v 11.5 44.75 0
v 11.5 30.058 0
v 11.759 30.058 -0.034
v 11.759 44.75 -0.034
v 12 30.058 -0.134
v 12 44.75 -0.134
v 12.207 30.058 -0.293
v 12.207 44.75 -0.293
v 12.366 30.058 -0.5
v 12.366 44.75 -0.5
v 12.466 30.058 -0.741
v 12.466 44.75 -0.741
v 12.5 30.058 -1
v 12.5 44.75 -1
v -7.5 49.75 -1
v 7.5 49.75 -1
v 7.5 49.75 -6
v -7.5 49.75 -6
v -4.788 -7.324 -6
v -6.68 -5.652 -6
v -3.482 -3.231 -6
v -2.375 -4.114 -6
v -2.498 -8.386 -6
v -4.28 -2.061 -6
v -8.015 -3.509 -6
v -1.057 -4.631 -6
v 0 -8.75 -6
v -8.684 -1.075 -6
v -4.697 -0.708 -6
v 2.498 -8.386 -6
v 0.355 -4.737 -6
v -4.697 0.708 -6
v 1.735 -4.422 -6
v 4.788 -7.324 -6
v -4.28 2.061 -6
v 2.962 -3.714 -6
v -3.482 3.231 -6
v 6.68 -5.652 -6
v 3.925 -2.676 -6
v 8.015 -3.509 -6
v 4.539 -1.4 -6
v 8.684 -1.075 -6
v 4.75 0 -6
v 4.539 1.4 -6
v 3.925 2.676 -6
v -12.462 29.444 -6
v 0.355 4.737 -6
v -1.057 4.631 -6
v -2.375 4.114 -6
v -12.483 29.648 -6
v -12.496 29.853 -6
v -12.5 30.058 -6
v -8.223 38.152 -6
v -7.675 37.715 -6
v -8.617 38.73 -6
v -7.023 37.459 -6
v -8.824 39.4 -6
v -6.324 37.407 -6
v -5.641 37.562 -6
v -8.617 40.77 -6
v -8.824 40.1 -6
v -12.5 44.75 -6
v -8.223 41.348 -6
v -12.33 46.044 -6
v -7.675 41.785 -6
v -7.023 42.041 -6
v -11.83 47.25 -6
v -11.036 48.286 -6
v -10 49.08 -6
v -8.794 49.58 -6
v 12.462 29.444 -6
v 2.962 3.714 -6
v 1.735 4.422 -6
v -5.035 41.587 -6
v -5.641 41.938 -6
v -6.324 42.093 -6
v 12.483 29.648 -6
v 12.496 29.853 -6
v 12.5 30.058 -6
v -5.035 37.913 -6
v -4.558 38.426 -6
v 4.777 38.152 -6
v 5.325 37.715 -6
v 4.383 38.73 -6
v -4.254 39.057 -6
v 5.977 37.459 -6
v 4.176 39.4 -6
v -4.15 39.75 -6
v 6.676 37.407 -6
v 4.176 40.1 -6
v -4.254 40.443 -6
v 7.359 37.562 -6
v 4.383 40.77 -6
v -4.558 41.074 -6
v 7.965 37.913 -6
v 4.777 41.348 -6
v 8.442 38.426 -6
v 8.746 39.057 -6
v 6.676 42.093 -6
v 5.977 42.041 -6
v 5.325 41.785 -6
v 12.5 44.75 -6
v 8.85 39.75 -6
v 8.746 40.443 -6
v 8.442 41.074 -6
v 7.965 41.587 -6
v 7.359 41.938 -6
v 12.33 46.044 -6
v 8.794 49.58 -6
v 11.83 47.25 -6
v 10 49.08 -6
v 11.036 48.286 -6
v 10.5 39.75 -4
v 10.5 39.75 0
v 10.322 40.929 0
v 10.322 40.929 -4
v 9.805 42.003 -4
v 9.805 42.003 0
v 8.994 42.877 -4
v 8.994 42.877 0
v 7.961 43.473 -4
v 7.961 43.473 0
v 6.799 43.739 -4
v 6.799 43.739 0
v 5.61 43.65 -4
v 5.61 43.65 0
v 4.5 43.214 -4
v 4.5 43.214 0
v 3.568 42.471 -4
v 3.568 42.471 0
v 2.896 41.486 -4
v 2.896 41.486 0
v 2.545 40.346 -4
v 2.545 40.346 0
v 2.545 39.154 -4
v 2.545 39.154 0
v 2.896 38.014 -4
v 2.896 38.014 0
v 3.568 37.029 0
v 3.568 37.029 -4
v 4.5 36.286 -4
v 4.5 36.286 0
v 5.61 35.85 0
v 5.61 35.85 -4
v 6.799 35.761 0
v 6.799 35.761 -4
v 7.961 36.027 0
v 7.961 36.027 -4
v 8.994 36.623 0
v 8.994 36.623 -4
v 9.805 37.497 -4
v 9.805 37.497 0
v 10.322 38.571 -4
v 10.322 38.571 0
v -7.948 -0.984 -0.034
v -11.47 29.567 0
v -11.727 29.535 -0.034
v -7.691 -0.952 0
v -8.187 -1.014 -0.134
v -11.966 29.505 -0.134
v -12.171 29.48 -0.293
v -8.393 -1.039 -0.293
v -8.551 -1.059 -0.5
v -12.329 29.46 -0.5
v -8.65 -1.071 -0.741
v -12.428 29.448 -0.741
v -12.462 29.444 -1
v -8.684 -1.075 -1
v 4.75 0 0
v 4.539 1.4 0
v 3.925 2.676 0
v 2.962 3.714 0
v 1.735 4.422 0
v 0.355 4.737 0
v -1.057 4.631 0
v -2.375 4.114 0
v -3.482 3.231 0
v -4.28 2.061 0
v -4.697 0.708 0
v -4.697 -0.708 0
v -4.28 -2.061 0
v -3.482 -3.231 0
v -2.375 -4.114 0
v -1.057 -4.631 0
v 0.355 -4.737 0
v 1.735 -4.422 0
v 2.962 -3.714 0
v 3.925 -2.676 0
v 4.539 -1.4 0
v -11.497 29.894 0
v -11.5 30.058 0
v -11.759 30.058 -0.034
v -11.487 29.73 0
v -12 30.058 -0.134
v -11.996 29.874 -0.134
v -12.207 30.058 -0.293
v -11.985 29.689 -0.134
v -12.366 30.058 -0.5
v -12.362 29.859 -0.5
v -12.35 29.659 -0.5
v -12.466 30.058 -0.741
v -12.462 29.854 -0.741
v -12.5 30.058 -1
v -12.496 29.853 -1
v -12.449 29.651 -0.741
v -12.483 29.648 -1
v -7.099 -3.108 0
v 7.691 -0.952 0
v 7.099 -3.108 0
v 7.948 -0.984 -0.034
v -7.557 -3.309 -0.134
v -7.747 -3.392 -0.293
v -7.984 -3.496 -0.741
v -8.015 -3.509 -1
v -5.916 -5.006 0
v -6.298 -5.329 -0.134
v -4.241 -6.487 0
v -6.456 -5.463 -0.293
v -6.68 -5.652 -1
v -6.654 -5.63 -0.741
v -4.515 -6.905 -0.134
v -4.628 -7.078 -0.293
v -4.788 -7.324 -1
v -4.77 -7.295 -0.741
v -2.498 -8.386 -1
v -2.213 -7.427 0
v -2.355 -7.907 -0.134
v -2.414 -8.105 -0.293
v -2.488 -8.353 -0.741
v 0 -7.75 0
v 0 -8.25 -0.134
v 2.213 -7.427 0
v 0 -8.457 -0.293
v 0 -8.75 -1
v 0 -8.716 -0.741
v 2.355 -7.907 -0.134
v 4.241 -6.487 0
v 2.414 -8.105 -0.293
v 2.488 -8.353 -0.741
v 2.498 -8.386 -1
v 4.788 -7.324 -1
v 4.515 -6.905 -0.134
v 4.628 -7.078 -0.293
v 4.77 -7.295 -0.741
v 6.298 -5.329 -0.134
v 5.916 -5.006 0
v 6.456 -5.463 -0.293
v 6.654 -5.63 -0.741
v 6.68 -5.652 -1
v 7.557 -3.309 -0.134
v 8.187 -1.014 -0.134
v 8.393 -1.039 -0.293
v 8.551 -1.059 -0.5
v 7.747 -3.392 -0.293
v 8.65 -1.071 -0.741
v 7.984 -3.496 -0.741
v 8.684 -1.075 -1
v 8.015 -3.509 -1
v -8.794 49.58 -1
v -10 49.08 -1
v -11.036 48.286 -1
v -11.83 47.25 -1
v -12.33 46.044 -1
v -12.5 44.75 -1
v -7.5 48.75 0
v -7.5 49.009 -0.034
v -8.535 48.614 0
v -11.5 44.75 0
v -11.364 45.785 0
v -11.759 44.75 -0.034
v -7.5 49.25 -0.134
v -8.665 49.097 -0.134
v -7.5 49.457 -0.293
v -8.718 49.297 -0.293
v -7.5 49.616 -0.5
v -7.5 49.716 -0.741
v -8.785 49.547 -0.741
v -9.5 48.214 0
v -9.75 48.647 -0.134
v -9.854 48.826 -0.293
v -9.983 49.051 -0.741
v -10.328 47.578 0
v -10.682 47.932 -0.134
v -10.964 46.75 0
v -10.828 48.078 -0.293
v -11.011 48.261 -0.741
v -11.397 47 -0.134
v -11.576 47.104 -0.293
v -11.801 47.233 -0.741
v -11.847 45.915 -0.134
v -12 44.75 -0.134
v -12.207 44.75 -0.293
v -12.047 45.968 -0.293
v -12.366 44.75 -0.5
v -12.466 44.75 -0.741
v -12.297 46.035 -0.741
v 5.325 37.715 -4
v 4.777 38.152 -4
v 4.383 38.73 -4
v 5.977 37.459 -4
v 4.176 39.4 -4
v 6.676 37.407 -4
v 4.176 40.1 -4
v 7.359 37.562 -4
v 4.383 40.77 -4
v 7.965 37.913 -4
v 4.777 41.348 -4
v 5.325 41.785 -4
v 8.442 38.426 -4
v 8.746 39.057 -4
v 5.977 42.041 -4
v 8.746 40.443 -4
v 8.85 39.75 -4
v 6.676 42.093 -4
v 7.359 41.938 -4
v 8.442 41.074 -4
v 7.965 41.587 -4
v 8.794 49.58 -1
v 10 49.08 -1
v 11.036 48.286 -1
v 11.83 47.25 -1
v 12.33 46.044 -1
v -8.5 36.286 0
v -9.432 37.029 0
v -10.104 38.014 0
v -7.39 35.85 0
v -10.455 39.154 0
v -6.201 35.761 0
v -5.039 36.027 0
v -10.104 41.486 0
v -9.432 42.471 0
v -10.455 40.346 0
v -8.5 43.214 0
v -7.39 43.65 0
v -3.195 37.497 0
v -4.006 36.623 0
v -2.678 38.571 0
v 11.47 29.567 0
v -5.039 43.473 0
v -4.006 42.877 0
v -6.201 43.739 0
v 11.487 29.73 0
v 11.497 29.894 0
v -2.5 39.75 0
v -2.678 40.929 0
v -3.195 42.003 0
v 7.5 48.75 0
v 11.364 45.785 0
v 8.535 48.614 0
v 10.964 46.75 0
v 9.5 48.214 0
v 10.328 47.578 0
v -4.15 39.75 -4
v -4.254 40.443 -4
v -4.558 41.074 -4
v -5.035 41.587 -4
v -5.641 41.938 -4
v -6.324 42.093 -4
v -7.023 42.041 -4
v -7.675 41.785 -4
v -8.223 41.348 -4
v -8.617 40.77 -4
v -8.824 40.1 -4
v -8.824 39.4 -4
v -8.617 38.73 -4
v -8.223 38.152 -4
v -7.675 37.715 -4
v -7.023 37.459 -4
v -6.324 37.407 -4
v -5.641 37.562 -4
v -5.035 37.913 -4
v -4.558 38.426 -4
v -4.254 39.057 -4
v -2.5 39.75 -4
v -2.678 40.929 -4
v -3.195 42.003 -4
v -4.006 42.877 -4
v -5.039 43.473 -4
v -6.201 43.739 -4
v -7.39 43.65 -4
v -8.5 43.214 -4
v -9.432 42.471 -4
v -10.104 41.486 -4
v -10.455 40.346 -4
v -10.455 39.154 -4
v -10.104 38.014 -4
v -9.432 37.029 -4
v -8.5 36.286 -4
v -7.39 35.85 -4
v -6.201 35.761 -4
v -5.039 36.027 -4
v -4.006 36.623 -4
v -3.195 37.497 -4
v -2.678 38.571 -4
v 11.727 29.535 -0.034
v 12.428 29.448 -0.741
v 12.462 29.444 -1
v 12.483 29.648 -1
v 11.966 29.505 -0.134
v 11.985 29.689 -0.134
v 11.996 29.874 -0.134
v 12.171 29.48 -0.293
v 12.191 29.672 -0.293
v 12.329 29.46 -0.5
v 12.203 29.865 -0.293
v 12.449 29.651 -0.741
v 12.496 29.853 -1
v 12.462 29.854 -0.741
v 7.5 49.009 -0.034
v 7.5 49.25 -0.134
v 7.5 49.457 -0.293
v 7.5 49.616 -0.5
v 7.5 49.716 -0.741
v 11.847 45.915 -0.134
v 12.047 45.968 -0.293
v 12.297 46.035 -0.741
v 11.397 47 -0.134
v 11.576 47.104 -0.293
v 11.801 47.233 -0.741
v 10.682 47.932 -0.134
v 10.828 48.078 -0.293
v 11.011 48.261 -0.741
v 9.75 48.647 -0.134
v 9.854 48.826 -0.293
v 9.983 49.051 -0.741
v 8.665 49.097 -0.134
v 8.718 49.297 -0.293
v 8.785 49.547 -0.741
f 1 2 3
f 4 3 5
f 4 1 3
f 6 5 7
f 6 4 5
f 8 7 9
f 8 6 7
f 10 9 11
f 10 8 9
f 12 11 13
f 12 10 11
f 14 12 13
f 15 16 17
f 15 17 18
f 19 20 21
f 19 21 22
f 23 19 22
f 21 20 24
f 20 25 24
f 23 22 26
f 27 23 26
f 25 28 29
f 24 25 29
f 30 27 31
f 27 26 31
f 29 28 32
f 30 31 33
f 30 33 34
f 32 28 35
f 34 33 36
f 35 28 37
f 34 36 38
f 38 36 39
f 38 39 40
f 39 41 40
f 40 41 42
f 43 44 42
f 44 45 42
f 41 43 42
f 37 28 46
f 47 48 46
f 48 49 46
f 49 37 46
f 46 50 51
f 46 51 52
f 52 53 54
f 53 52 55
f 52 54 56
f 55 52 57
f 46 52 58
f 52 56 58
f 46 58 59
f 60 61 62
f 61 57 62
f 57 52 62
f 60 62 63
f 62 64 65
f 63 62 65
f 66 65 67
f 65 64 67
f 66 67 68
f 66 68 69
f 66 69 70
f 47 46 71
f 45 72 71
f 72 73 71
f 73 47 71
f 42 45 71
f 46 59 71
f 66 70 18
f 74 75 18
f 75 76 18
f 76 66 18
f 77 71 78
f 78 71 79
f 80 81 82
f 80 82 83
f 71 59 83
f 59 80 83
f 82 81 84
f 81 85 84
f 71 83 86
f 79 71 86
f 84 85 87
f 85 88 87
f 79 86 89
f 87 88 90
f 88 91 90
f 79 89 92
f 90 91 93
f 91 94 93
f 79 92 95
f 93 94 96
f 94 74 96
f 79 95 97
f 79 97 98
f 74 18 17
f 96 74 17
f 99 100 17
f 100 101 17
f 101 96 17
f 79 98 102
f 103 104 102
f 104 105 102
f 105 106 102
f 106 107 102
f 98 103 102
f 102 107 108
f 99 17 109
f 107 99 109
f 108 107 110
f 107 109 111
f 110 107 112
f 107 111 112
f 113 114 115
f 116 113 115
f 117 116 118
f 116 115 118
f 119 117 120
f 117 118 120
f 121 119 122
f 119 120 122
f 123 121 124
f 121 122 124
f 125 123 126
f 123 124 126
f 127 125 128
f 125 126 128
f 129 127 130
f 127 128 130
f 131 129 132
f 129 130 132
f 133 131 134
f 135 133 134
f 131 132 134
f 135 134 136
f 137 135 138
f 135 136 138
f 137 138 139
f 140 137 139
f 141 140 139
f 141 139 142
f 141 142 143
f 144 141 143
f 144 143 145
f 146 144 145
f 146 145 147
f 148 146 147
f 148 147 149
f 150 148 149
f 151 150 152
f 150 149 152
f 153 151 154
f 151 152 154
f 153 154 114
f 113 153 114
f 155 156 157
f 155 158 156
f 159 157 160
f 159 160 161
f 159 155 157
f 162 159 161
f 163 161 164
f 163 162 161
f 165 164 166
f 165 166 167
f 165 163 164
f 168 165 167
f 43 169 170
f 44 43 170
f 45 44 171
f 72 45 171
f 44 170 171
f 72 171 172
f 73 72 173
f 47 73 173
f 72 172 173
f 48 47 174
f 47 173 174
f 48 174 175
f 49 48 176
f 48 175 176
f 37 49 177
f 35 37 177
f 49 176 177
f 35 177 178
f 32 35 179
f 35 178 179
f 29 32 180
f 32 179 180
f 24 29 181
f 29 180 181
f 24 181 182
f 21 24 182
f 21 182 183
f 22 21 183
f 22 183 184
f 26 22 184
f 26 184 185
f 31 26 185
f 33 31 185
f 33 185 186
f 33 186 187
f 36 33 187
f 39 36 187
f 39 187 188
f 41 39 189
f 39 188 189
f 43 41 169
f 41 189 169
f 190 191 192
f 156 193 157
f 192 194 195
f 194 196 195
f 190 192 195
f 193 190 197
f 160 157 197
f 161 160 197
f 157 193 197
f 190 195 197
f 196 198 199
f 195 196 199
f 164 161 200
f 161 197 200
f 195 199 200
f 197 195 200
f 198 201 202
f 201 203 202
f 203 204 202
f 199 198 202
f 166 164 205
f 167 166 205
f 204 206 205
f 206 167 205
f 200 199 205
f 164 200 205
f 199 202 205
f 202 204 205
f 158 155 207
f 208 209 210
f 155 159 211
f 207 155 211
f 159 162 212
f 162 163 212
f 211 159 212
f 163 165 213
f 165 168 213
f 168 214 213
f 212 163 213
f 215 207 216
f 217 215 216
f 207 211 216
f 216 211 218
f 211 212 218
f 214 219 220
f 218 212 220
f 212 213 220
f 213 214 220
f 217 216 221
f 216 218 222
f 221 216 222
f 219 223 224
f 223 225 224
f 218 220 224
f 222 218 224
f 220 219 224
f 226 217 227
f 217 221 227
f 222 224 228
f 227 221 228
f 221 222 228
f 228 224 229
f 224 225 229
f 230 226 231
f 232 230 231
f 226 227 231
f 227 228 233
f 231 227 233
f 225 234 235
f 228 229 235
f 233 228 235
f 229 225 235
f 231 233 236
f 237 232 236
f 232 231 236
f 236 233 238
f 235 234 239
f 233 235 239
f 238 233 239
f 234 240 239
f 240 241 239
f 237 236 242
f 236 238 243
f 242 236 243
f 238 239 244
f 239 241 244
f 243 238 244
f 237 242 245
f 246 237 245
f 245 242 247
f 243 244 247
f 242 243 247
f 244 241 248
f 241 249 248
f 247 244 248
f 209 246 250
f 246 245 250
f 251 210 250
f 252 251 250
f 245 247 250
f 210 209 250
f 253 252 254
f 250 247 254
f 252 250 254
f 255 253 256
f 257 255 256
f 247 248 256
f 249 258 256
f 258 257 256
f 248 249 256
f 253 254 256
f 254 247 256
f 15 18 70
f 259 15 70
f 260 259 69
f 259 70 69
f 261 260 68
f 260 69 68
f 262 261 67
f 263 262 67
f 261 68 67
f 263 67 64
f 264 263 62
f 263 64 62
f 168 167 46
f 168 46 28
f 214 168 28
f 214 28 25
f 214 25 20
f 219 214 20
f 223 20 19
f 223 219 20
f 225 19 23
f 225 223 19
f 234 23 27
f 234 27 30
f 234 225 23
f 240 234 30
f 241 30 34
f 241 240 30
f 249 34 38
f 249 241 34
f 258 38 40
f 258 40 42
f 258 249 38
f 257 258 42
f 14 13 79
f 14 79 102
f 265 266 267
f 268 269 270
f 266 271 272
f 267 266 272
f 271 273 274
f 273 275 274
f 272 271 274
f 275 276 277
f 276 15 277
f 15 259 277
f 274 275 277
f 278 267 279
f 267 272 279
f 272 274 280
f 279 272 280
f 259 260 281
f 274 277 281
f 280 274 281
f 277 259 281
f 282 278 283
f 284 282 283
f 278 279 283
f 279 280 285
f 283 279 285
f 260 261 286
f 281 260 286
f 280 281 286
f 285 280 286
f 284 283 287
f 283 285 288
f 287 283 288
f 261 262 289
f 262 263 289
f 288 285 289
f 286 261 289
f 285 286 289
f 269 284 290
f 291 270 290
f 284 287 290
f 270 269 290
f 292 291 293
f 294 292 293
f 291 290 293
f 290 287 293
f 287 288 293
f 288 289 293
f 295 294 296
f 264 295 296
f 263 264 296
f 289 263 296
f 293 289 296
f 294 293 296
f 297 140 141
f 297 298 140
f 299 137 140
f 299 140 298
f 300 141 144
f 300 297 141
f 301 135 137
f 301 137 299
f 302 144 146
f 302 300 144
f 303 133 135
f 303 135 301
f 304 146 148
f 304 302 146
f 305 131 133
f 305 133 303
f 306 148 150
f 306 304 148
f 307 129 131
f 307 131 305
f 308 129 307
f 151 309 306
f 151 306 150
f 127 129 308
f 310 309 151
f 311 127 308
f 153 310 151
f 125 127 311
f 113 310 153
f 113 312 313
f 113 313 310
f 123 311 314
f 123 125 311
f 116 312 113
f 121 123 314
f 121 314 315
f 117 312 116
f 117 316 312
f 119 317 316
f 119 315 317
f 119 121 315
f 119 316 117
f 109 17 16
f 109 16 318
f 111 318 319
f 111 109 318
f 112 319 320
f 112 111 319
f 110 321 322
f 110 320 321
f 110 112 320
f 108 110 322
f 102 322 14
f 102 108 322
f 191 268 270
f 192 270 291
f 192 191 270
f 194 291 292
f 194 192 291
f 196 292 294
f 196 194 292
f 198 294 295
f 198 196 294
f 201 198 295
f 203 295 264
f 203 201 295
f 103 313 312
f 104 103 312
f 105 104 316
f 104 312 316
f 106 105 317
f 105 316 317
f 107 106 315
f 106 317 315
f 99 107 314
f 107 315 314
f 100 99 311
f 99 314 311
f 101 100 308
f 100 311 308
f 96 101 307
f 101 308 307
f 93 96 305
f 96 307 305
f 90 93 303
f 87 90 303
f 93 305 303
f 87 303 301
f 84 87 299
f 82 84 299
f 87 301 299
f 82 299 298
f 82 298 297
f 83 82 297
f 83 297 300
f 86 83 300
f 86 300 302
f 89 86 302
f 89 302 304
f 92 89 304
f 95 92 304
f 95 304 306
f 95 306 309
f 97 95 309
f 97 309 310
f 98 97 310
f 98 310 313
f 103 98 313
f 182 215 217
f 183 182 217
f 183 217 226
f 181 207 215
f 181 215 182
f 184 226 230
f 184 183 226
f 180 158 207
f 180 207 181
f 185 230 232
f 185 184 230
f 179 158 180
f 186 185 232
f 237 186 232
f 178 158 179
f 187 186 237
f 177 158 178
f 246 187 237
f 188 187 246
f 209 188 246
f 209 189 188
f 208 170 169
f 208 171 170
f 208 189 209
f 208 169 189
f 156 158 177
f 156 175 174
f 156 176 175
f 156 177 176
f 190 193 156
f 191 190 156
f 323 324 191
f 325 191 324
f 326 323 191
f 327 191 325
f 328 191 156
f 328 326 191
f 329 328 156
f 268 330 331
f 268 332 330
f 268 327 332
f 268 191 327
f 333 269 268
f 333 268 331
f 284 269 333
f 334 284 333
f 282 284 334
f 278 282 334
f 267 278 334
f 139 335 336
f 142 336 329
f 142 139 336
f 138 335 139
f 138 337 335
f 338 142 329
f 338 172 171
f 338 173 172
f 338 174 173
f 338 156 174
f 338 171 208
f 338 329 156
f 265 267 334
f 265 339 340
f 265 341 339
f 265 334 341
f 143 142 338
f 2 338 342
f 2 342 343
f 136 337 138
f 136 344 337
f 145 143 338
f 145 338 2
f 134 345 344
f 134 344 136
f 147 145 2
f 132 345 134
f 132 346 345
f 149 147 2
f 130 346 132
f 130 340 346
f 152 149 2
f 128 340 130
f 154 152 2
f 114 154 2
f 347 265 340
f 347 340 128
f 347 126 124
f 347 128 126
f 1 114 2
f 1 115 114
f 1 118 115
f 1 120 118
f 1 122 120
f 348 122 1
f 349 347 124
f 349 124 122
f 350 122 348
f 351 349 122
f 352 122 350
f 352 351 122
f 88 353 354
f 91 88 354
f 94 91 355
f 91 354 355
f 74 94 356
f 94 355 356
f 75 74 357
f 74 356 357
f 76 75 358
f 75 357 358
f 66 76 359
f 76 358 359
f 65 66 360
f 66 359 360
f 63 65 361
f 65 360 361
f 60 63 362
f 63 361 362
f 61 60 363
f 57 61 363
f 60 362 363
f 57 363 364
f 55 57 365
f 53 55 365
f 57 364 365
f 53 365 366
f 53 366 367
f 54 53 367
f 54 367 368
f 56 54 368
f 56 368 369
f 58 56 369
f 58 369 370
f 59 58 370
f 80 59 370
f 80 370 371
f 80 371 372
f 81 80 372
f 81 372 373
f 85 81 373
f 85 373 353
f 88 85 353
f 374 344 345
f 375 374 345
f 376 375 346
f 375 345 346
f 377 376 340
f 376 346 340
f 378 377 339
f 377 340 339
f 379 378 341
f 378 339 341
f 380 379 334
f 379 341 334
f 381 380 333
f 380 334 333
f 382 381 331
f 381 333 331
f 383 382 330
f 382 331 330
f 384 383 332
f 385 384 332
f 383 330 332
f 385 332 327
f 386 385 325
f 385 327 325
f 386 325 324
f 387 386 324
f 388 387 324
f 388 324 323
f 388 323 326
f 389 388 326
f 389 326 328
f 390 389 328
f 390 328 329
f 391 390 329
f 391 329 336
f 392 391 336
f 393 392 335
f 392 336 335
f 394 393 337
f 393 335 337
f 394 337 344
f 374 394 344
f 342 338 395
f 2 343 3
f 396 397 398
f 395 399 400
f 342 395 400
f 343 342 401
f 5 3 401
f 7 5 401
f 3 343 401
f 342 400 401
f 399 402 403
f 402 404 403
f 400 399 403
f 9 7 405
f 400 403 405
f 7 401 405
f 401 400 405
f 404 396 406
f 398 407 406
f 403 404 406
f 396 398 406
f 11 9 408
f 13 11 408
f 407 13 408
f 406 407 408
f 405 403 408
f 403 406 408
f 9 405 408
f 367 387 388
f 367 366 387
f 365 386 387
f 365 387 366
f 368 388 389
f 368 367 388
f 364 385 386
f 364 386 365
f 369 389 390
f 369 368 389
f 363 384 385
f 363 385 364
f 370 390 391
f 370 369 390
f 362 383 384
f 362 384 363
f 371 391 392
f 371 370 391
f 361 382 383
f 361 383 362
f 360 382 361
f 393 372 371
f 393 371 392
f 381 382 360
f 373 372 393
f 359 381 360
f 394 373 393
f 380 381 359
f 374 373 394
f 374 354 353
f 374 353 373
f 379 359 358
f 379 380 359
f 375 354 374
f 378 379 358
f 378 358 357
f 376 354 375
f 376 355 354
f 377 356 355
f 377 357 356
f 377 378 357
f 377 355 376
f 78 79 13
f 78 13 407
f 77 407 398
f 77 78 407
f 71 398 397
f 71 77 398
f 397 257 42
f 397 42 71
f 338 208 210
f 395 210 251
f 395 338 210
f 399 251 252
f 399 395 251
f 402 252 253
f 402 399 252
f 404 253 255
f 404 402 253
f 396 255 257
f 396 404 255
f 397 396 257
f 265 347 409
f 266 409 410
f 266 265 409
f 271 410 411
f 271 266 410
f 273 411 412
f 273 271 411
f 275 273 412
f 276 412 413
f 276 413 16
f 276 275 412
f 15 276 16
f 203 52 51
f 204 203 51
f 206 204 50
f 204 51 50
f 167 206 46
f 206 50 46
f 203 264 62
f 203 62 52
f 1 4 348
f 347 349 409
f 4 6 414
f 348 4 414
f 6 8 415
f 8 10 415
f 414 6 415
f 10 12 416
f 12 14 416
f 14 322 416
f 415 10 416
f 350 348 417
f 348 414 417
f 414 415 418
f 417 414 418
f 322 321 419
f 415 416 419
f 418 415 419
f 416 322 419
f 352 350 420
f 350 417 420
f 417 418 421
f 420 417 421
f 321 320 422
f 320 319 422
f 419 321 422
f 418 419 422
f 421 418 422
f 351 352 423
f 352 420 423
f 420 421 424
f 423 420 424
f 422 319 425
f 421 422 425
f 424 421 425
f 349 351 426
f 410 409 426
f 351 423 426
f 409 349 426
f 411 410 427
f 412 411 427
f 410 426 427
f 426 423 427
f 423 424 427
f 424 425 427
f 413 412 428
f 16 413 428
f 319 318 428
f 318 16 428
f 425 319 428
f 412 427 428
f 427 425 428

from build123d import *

# Parameters (mm, degrees)
F0_R     = 4.75
F0_R_2   = 4
F0_R_3   = 2.35
F1_DEPTH = 6
F2_DEPTH = 4
F3_R     = 5
F4_R     = 1


with BuildPart() as f1:
    # F0 (on Top) → F1 (new body)
    with BuildSketch(Plane.XY):
        with BuildLine():
            Line((12.5, 49.75), (-12.5, 49.75))
            Line((-12.5, 49.75), (-12.5, 29.75))
            Line((-12.5, 29.75), (-8.683703, -1.075085))
            ThreePointArc((-8.683703, -1.075085), (0, -8.75), (8.683703, -1.075085))
            Line((8.683703, -1.075085), (12.5, 29.75))
            Line((12.5, 29.75), (12.5, 49.75))
        make_face()
        Circle(F0_R, mode=Mode.SUBTRACT)
        with Locations((-6.5, 39.75)):
            Circle(F0_R_2, mode=Mode.SUBTRACT)
        with Locations((6.5, 39.75)):
            Circle(F0_R_2, mode=Mode.SUBTRACT)
        with Locations((-6.5, 39.75)):
            Circle(F0_R_2)
        with Locations((-6.5, 39.75)):
            Circle(F0_R_3, mode=Mode.SUBTRACT)
        with Locations((6.5, 39.75)):
            Circle(F0_R_2)
        with Locations((6.5, 39.75)):
            Circle(F0_R_3, mode=Mode.SUBTRACT)
    extrude(amount=-F1_DEPTH)

    # F0 (on Top) → F2 (cut)
    with BuildSketch(Plane.XY):
        with Locations((-6.5, 39.75)):
            Circle(F0_R_2)
        with Locations((-6.5, 39.75)):
            Circle(F0_R_3, mode=Mode.SUBTRACT)
        with Locations((6.5, 39.75)):
            Circle(F0_R_2)
        with Locations((6.5, 39.75)):
            Circle(F0_R_3, mode=Mode.SUBTRACT)
    extrude(amount=-F2_DEPTH, mode=Mode.SUBTRACT)

    # F3
    f3_edges = [f1.edges().sort_by_distance(p)[0] for p in [
        (-12.5, 49.75, -3),
        (12.5, 49.75, -3),
        (-12.5, 29.75, -3),
        (12.5, 29.75, -3),
    ]]
    fillet(f3_edges, radius=F3_R)

    # F4
    f4_edges = [f1.edges().sort_by_distance(p)[0] for p in [
        (-10.572909, 14.184458, 0),
    ]]
    fillet(f4_edges, radius=F4_R)


solid = f1.part
